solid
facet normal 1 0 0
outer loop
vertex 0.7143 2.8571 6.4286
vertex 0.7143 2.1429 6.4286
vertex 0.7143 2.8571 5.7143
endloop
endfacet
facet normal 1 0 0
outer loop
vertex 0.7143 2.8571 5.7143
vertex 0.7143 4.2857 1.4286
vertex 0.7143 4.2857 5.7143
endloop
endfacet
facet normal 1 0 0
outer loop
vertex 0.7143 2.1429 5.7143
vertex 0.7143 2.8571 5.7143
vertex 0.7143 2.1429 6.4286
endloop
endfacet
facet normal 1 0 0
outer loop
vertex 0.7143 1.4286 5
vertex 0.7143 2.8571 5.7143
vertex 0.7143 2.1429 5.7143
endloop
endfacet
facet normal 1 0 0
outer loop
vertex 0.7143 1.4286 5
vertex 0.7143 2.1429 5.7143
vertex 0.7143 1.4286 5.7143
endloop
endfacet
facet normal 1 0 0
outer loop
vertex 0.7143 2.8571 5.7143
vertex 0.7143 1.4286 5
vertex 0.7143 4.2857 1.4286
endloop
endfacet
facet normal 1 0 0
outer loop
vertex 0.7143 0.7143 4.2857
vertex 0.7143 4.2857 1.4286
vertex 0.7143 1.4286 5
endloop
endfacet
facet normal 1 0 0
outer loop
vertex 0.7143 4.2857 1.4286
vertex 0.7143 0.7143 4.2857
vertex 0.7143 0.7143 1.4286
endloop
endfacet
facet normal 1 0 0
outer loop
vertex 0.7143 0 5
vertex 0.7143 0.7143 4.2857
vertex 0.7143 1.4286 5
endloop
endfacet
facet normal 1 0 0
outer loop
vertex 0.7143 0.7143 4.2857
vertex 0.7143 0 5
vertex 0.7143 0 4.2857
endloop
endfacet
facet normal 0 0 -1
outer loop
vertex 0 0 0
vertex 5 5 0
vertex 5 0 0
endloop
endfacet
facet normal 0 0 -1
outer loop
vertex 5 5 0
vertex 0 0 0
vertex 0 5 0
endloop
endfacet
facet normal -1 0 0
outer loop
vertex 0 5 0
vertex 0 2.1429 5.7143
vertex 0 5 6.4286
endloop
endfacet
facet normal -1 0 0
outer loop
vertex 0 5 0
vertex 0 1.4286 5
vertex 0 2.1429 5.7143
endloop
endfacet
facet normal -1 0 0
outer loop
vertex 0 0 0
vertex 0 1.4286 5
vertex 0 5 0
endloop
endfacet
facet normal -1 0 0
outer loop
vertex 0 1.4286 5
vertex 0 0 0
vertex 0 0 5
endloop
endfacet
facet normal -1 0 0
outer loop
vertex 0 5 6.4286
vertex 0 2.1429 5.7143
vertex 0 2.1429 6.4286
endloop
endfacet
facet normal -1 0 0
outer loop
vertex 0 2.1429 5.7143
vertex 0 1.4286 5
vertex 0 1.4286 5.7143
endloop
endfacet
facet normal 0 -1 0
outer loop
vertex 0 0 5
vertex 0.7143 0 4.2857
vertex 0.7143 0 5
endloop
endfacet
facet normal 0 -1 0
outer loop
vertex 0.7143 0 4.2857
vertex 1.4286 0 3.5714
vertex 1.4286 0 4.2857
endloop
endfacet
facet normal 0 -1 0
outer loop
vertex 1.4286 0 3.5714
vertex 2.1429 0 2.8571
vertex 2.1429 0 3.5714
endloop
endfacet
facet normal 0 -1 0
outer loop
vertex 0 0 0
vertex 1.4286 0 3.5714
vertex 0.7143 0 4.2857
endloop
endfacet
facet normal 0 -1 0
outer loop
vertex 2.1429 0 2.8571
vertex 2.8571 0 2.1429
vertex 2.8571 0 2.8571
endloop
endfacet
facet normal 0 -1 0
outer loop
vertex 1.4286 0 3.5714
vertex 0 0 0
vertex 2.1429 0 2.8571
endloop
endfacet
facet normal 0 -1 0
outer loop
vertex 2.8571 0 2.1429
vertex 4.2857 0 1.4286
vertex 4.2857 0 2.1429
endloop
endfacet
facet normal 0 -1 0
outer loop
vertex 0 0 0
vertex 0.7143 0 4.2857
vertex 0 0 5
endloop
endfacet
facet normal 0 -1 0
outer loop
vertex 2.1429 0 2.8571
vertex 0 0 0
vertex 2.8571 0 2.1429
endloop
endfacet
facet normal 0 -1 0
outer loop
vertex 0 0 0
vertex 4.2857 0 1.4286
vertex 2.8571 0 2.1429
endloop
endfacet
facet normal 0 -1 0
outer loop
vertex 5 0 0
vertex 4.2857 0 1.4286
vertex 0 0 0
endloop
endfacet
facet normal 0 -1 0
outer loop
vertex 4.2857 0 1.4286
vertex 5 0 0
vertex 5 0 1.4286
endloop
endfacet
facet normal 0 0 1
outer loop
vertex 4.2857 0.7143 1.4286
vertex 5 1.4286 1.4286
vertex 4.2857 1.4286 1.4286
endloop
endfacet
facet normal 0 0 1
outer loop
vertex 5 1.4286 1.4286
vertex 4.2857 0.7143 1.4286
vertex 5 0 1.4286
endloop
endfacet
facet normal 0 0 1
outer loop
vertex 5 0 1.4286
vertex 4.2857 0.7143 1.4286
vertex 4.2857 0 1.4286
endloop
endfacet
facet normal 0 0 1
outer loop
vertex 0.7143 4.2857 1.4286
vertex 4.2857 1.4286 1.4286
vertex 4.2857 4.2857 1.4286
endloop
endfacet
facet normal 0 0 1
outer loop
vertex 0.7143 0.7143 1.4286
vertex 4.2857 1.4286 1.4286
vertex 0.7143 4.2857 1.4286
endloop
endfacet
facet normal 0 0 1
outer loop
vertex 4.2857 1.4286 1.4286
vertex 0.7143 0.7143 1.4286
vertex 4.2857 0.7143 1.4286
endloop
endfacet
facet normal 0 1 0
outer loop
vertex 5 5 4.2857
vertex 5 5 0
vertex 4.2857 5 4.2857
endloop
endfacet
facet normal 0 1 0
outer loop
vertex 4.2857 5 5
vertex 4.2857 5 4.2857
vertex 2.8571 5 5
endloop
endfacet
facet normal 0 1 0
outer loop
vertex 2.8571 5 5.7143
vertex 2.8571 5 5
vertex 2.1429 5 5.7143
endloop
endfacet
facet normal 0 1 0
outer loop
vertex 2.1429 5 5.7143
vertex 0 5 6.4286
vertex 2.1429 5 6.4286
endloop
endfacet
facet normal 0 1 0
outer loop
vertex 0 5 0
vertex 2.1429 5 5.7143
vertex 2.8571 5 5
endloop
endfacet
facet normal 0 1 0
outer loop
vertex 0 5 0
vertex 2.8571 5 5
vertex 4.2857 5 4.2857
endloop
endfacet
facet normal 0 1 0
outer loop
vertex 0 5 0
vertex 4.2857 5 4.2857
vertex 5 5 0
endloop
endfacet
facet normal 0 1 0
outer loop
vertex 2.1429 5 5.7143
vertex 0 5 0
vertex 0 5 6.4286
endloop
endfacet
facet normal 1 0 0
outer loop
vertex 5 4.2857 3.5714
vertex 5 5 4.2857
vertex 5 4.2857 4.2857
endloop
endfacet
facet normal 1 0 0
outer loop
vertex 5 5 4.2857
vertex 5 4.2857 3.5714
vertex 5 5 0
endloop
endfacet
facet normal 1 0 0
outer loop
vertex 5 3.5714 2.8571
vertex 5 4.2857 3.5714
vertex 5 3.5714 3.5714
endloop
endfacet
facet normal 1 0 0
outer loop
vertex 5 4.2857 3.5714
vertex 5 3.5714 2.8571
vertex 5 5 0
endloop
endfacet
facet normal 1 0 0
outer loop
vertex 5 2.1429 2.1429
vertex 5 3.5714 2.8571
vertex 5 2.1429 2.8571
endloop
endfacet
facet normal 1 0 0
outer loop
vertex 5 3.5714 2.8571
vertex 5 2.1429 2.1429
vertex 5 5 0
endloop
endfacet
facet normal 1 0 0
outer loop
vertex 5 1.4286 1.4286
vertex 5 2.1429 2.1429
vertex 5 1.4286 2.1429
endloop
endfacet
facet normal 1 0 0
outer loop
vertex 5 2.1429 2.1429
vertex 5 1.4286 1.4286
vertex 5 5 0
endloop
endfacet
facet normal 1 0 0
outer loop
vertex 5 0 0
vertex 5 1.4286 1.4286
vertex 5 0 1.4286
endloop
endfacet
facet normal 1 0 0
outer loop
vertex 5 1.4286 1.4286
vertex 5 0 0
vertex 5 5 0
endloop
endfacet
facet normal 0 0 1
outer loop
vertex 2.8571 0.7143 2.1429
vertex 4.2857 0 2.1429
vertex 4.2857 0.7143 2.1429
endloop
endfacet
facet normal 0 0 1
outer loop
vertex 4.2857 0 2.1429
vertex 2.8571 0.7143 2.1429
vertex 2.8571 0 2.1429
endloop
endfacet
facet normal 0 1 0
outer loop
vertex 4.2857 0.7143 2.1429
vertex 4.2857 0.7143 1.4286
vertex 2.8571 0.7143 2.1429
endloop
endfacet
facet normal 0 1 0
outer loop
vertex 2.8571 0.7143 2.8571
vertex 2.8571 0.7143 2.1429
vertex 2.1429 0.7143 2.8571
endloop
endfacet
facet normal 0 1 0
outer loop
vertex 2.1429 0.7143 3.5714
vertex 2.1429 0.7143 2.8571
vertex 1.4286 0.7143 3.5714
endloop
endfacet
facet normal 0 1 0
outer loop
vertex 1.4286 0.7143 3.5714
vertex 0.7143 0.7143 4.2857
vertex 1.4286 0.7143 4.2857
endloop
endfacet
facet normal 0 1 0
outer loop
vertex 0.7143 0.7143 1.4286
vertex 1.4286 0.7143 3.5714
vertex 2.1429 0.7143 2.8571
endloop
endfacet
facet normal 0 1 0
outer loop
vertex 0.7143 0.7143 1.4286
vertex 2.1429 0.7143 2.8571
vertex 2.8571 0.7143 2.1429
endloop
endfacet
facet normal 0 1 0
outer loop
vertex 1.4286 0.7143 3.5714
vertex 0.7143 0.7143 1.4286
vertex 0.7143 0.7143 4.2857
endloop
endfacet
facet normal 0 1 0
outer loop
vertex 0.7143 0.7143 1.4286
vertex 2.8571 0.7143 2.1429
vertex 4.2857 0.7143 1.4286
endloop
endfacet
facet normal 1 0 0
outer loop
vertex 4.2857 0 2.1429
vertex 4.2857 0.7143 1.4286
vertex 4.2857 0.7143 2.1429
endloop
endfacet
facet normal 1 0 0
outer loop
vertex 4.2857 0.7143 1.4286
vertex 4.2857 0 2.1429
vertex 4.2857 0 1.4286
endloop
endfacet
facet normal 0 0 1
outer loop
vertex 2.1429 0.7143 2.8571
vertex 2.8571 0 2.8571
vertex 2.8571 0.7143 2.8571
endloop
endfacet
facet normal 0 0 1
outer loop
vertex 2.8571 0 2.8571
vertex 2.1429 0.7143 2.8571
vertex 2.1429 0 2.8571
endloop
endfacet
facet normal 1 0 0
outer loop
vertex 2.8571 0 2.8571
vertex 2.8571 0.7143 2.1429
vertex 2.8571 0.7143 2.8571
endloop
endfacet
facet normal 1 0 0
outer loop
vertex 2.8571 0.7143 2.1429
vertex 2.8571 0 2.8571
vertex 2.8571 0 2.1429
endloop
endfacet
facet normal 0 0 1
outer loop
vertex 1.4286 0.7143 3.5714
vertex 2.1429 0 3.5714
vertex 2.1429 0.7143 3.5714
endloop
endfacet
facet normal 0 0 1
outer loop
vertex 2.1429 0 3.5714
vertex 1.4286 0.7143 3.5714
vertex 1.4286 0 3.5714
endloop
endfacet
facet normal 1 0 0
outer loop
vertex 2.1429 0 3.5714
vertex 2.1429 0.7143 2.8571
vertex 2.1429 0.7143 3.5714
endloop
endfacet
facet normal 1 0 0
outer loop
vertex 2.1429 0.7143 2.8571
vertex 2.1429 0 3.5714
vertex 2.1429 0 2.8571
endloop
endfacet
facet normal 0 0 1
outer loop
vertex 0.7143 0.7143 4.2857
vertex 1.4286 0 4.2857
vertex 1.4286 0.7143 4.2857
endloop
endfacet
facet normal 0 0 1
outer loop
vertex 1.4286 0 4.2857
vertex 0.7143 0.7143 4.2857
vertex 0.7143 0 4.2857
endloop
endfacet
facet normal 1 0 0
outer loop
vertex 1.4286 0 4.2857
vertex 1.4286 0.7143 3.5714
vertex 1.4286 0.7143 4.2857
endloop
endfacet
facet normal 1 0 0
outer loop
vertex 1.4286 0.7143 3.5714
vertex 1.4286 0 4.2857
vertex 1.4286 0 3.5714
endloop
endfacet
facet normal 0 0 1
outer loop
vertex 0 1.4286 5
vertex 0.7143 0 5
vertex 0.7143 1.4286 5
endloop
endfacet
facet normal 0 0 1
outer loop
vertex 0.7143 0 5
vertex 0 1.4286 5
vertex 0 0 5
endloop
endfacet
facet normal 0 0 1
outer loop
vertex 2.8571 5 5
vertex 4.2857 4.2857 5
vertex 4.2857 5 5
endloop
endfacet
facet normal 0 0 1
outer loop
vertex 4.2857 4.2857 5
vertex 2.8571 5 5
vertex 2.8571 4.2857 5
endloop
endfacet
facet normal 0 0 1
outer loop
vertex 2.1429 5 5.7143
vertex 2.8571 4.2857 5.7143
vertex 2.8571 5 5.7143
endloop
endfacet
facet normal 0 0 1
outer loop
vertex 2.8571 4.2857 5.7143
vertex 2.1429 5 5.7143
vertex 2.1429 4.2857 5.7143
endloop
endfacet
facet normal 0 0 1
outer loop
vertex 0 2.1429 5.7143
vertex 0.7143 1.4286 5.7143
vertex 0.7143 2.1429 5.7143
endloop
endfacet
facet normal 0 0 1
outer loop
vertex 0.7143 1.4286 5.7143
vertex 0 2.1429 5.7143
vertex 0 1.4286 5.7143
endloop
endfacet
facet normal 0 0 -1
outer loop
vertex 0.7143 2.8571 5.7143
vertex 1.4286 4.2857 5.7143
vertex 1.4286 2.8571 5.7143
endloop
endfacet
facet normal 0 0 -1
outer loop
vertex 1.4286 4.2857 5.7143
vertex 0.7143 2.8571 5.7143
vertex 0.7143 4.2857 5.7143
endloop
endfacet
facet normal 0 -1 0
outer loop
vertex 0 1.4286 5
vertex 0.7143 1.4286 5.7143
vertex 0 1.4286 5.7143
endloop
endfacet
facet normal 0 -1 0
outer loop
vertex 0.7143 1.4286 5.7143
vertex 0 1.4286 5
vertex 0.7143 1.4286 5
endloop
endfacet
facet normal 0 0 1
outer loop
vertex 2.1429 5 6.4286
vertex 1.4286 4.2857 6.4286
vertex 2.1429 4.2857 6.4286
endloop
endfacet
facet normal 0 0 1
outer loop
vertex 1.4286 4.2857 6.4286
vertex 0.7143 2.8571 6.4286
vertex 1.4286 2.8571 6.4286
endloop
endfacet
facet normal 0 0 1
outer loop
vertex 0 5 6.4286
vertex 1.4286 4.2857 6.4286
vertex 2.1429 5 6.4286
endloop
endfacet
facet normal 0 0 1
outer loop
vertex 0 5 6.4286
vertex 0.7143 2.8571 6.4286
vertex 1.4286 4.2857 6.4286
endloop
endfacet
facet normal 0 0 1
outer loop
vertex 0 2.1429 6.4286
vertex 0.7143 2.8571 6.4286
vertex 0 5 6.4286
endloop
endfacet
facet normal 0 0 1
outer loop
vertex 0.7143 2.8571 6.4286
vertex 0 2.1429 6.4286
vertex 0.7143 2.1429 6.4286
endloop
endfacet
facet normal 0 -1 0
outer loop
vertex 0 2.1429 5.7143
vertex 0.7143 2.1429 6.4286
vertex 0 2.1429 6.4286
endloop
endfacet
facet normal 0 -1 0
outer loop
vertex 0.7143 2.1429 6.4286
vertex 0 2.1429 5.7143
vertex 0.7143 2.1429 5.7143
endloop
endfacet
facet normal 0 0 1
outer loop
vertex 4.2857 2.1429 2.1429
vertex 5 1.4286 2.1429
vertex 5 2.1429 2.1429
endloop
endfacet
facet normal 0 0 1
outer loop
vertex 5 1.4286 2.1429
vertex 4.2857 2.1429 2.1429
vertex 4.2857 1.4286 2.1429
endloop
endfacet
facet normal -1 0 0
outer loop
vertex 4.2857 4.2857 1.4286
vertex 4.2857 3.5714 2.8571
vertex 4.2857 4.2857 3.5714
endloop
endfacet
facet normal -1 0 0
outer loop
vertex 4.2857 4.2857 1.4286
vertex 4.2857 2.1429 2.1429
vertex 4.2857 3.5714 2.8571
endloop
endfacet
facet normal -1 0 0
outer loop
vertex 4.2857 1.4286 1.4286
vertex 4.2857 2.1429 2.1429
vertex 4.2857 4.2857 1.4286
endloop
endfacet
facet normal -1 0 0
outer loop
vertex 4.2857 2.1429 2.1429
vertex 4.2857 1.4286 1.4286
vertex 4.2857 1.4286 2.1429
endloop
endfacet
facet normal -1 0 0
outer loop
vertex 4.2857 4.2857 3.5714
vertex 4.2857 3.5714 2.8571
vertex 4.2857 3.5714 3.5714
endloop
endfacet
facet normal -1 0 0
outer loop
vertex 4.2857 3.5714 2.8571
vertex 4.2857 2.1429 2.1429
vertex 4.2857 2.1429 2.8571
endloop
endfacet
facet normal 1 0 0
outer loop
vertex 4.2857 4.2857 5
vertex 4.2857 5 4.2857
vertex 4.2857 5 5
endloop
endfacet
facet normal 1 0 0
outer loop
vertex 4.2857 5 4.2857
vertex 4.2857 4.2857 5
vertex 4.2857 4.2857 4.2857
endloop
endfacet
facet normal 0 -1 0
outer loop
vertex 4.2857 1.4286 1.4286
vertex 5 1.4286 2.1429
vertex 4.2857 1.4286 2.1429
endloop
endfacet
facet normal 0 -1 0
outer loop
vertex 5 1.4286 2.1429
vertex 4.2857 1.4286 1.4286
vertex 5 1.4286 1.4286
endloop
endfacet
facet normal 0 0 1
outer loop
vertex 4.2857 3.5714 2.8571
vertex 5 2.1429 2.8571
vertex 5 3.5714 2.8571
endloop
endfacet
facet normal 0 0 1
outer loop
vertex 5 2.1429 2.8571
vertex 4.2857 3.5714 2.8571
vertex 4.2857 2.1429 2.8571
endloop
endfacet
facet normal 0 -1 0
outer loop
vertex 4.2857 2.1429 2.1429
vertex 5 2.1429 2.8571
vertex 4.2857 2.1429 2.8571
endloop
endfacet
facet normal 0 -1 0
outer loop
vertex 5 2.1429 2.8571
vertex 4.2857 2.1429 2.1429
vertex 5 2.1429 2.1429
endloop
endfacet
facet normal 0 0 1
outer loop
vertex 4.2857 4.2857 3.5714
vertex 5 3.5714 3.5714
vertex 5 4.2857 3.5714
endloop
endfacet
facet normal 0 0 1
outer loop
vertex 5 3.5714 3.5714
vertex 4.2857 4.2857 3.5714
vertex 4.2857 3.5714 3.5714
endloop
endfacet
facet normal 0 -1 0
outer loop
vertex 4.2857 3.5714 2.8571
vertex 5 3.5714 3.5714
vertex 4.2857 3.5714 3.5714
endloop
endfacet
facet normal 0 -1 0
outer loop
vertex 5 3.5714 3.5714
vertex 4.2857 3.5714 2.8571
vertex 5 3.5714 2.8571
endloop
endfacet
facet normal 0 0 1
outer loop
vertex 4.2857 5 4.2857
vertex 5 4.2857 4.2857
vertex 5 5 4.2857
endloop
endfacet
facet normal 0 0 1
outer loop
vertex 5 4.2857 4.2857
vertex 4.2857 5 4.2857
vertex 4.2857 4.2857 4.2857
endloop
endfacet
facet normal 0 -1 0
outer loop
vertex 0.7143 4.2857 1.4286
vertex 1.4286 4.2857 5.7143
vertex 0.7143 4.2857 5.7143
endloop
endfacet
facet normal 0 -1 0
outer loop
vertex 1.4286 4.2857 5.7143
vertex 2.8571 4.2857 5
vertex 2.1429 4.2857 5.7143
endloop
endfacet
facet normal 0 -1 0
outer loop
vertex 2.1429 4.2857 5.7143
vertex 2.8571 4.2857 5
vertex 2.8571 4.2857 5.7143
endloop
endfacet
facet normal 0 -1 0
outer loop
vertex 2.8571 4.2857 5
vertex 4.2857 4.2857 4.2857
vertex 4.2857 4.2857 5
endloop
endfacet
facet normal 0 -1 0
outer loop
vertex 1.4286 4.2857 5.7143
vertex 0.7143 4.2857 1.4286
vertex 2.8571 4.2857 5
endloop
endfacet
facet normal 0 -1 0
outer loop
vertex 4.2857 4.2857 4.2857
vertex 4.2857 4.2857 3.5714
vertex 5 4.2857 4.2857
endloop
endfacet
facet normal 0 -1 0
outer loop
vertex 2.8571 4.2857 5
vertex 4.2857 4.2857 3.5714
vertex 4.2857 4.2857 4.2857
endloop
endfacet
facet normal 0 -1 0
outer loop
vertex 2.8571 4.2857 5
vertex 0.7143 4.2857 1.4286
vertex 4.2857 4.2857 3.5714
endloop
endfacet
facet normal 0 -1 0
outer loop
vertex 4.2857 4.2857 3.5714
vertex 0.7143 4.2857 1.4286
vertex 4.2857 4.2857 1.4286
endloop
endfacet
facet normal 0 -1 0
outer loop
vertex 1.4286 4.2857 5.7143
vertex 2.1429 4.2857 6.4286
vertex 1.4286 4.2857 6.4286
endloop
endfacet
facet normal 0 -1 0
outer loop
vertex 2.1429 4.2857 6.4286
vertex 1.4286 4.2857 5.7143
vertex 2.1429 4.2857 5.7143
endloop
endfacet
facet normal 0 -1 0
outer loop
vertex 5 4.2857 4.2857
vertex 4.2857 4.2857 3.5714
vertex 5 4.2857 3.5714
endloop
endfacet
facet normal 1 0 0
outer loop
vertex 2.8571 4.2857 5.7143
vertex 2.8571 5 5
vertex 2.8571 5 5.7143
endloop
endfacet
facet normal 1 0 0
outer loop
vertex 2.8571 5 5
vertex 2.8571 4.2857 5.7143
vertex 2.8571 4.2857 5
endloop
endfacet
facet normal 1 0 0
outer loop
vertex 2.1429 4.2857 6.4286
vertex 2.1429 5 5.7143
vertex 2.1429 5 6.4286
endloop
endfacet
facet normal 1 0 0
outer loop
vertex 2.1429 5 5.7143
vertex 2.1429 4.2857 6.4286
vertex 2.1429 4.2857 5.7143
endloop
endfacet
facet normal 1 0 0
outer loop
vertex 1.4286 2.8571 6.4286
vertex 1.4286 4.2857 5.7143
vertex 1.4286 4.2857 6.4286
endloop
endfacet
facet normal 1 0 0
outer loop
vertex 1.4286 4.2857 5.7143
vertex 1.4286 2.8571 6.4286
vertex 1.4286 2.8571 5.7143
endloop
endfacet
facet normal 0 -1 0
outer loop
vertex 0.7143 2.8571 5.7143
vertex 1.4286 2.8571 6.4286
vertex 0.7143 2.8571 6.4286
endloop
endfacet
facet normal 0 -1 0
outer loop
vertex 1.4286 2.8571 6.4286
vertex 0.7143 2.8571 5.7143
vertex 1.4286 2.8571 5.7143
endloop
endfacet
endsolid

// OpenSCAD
// file: hollowvoxels.scad
//wt = wall thickness
module hunitcube(wt) {
	diff = 2*wt;
	cube([1,1,1]);
	translate([wt,wt,wt])
	scale([1-diff,1-diff,1-diff])
	cube([1,1,1]);
}

module hcube(v=[1,1,1], wt) {
	for (i=[0:v[0]-1]) {
	for (j=[0:v[1]-1]) {
	for (k=[0:v[2]-1]) {
		translate([i,j,k])
		hunitcube(wt);
	}
	}
	}
}

module hcubefivesevenths(v=[1,1,1]) {
	hcube(v, 0.1*7/5);
}
// main file
use <hollowvoxels.scad>;

scale(5/7,5/7,5/7){
hcubefivesevenths([7,7,2]);

translate([0,0,2])
hcubefivesevenths([6,1,1]);

translate([0,0,3])
hcubefivesevenths([4,1,1]);

translate([0,0,4])
hcubefivesevenths([3,1,1]);

translate([0,0,5])
hcubefivesevenths([2,1,1]);

translate([0,0,6])
hcubefivesevenths([1,1,1]);

hcubefivesevenths([1,7,7]);

translate([0,2,7])
hcubefivesevenths([1,5,1]);

translate([0,3,8])
hcubefivesevenths([1,4,1]);

translate([6,2,2])
hcubefivesevenths([1,5,1]);

translate([6,3,3])
hcubefivesevenths([1,4,1]);

translate([6,5,4])
hcubefivesevenths([1,2,1]);

translate([6,6,5])
hcubefivesevenths([1,1,1]);

translate([0,6,0])
hcubefivesevenths([6,1,7]);

translate([0,6,7])
hcubefivesevenths([4,1,1]);

translate([0,6,8])
hcubefivesevenths([3,1,1]);

translate([1,4,8])
hcubefivesevenths([1,3,1]);
}
